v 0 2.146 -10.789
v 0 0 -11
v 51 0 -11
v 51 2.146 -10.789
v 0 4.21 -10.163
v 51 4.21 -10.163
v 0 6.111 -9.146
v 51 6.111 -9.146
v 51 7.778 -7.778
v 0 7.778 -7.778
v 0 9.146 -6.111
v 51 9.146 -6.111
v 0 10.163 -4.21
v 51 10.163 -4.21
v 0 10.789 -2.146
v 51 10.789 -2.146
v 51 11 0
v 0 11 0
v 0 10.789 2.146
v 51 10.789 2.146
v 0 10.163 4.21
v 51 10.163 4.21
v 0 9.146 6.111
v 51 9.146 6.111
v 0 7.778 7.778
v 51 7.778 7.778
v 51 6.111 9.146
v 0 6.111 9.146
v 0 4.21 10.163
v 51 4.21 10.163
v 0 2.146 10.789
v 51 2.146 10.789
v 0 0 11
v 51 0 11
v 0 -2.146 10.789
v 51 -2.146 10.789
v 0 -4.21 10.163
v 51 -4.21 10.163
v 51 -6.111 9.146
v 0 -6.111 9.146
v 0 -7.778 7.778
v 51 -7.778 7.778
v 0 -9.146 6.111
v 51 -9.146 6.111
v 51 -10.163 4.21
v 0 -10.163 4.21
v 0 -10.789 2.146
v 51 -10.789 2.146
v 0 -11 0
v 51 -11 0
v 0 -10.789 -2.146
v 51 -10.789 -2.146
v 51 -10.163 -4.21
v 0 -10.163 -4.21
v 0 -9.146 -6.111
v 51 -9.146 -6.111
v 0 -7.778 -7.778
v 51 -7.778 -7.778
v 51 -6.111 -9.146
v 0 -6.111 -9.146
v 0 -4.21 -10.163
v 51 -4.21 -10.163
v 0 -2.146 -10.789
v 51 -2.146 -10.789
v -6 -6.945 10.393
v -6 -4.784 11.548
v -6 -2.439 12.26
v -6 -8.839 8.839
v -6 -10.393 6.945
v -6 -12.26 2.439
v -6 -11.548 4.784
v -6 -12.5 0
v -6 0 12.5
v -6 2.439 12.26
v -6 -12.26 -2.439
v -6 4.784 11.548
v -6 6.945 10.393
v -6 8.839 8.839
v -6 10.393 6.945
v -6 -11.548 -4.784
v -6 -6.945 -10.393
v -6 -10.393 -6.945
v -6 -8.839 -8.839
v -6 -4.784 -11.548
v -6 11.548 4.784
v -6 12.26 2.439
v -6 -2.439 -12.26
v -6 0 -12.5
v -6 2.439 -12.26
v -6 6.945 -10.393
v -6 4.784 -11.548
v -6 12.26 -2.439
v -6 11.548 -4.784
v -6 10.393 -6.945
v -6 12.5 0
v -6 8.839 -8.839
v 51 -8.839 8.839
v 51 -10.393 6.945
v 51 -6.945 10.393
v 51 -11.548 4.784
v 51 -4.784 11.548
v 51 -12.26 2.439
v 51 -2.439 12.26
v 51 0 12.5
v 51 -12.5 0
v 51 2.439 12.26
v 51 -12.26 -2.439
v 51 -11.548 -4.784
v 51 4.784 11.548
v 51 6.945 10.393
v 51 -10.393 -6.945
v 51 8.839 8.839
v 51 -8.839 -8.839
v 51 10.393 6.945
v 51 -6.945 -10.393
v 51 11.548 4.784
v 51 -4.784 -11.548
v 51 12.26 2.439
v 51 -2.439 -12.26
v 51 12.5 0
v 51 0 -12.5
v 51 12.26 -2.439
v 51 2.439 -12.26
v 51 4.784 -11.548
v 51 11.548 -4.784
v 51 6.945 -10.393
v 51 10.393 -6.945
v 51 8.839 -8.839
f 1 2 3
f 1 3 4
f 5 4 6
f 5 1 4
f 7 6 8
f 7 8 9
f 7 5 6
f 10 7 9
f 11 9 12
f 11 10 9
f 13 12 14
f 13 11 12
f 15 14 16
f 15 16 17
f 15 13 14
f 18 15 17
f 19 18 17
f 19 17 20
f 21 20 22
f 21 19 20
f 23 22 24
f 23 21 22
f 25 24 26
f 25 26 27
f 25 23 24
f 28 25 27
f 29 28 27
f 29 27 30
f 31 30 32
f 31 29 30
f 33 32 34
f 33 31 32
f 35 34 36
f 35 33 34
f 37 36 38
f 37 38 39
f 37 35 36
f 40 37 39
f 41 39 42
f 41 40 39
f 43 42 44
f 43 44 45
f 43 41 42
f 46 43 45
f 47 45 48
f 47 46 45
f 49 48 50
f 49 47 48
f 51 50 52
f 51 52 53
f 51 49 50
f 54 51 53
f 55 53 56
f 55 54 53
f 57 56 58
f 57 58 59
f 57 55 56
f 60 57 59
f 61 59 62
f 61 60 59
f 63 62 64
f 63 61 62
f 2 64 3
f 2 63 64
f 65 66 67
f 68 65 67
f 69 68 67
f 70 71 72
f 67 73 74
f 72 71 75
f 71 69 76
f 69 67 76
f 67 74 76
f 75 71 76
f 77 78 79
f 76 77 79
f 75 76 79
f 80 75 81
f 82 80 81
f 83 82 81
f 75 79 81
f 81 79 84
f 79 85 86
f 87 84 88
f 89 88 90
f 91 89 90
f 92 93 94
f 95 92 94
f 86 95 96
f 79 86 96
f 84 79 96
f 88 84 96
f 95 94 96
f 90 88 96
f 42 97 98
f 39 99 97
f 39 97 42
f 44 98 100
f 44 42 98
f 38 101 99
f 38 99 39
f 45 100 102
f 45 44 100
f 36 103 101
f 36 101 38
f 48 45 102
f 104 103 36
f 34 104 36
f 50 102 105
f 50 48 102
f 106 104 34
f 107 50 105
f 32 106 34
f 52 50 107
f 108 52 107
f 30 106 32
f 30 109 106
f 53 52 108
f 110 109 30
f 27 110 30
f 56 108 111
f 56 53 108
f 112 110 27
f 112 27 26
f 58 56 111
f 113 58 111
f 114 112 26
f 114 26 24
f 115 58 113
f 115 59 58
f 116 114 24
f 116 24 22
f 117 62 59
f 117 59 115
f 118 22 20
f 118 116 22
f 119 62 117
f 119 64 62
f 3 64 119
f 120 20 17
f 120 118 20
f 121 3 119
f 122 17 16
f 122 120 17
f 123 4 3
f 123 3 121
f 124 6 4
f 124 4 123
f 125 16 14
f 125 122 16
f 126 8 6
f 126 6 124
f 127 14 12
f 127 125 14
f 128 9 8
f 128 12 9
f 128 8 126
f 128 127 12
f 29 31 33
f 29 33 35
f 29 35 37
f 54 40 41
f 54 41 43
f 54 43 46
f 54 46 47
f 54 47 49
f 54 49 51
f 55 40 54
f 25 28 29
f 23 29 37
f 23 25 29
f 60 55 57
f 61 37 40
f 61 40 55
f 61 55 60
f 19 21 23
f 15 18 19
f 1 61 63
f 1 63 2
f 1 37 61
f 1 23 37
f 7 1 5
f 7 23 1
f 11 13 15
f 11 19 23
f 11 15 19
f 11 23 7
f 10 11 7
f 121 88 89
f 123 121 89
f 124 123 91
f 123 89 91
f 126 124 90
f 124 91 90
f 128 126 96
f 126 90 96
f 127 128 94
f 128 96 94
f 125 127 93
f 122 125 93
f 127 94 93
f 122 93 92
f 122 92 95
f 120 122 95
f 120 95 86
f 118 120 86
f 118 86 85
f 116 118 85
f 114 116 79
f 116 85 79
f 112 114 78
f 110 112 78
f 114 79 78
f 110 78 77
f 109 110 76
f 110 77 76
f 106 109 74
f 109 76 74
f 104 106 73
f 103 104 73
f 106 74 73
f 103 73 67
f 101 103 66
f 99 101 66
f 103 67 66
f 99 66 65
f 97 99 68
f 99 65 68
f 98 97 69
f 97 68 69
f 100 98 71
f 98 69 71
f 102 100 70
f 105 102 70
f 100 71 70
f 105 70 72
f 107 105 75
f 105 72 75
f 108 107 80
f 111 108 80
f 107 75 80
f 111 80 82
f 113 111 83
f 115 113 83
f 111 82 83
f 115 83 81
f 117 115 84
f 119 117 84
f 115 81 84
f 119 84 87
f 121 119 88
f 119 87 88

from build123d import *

# Parameters (mm, degrees)
CYLINDER006_R           = 11
CYLINDER006_DEPTH       = 51
CYLINDER006_PITCH_ANGLE = 90
CYLINDER005_R           = 12.5
CYLINDER005_DEPTH       = 57
CYLINDER005_PITCH_ANGLE = 90


with BuildPart() as cylinder004:
    # Cylinder006 → Cylinder006 (new body)
    with BuildSketch(Plane.XY):
        Circle(CYLINDER006_R)
    extrude(amount=CYLINDER006_DEPTH)


with BuildPart() as cylinder004_1:
    # Cylinder006 pitch: moved
    add(cylinder004.part.rotate(Axis((0, 0, 0), (0, 1, 0)), CYLINDER006_PITCH_ANGLE))


with BuildPart() as cylinder004_2:
    # Cylinder006 placement: moved
    add(cylinder004_1.part)


with BuildPart() as batterycap:
    # Cylinder005 → Cylinder005 (new body)
    with BuildSketch(Plane.XY):
        Circle(CYLINDER005_R)
    extrude(amount=CYLINDER005_DEPTH)


with BuildPart() as batterycap_1:
    # Cylinder005 pitch: moved
    add(batterycap.part.rotate(Axis((0, 0, 0), (0, 1, 0)), CYLINDER005_PITCH_ANGLE))


with BuildPart() as batterycap_2:
    # Cylinder005 placement: moved
    add(batterycap_1.part.moved(Location((-6, 0, 0))))

    # Cut003: cut Cylinder004
    add(cylinder004_2.part, mode=Mode.SUBTRACT)


solid = batterycap_2.part
